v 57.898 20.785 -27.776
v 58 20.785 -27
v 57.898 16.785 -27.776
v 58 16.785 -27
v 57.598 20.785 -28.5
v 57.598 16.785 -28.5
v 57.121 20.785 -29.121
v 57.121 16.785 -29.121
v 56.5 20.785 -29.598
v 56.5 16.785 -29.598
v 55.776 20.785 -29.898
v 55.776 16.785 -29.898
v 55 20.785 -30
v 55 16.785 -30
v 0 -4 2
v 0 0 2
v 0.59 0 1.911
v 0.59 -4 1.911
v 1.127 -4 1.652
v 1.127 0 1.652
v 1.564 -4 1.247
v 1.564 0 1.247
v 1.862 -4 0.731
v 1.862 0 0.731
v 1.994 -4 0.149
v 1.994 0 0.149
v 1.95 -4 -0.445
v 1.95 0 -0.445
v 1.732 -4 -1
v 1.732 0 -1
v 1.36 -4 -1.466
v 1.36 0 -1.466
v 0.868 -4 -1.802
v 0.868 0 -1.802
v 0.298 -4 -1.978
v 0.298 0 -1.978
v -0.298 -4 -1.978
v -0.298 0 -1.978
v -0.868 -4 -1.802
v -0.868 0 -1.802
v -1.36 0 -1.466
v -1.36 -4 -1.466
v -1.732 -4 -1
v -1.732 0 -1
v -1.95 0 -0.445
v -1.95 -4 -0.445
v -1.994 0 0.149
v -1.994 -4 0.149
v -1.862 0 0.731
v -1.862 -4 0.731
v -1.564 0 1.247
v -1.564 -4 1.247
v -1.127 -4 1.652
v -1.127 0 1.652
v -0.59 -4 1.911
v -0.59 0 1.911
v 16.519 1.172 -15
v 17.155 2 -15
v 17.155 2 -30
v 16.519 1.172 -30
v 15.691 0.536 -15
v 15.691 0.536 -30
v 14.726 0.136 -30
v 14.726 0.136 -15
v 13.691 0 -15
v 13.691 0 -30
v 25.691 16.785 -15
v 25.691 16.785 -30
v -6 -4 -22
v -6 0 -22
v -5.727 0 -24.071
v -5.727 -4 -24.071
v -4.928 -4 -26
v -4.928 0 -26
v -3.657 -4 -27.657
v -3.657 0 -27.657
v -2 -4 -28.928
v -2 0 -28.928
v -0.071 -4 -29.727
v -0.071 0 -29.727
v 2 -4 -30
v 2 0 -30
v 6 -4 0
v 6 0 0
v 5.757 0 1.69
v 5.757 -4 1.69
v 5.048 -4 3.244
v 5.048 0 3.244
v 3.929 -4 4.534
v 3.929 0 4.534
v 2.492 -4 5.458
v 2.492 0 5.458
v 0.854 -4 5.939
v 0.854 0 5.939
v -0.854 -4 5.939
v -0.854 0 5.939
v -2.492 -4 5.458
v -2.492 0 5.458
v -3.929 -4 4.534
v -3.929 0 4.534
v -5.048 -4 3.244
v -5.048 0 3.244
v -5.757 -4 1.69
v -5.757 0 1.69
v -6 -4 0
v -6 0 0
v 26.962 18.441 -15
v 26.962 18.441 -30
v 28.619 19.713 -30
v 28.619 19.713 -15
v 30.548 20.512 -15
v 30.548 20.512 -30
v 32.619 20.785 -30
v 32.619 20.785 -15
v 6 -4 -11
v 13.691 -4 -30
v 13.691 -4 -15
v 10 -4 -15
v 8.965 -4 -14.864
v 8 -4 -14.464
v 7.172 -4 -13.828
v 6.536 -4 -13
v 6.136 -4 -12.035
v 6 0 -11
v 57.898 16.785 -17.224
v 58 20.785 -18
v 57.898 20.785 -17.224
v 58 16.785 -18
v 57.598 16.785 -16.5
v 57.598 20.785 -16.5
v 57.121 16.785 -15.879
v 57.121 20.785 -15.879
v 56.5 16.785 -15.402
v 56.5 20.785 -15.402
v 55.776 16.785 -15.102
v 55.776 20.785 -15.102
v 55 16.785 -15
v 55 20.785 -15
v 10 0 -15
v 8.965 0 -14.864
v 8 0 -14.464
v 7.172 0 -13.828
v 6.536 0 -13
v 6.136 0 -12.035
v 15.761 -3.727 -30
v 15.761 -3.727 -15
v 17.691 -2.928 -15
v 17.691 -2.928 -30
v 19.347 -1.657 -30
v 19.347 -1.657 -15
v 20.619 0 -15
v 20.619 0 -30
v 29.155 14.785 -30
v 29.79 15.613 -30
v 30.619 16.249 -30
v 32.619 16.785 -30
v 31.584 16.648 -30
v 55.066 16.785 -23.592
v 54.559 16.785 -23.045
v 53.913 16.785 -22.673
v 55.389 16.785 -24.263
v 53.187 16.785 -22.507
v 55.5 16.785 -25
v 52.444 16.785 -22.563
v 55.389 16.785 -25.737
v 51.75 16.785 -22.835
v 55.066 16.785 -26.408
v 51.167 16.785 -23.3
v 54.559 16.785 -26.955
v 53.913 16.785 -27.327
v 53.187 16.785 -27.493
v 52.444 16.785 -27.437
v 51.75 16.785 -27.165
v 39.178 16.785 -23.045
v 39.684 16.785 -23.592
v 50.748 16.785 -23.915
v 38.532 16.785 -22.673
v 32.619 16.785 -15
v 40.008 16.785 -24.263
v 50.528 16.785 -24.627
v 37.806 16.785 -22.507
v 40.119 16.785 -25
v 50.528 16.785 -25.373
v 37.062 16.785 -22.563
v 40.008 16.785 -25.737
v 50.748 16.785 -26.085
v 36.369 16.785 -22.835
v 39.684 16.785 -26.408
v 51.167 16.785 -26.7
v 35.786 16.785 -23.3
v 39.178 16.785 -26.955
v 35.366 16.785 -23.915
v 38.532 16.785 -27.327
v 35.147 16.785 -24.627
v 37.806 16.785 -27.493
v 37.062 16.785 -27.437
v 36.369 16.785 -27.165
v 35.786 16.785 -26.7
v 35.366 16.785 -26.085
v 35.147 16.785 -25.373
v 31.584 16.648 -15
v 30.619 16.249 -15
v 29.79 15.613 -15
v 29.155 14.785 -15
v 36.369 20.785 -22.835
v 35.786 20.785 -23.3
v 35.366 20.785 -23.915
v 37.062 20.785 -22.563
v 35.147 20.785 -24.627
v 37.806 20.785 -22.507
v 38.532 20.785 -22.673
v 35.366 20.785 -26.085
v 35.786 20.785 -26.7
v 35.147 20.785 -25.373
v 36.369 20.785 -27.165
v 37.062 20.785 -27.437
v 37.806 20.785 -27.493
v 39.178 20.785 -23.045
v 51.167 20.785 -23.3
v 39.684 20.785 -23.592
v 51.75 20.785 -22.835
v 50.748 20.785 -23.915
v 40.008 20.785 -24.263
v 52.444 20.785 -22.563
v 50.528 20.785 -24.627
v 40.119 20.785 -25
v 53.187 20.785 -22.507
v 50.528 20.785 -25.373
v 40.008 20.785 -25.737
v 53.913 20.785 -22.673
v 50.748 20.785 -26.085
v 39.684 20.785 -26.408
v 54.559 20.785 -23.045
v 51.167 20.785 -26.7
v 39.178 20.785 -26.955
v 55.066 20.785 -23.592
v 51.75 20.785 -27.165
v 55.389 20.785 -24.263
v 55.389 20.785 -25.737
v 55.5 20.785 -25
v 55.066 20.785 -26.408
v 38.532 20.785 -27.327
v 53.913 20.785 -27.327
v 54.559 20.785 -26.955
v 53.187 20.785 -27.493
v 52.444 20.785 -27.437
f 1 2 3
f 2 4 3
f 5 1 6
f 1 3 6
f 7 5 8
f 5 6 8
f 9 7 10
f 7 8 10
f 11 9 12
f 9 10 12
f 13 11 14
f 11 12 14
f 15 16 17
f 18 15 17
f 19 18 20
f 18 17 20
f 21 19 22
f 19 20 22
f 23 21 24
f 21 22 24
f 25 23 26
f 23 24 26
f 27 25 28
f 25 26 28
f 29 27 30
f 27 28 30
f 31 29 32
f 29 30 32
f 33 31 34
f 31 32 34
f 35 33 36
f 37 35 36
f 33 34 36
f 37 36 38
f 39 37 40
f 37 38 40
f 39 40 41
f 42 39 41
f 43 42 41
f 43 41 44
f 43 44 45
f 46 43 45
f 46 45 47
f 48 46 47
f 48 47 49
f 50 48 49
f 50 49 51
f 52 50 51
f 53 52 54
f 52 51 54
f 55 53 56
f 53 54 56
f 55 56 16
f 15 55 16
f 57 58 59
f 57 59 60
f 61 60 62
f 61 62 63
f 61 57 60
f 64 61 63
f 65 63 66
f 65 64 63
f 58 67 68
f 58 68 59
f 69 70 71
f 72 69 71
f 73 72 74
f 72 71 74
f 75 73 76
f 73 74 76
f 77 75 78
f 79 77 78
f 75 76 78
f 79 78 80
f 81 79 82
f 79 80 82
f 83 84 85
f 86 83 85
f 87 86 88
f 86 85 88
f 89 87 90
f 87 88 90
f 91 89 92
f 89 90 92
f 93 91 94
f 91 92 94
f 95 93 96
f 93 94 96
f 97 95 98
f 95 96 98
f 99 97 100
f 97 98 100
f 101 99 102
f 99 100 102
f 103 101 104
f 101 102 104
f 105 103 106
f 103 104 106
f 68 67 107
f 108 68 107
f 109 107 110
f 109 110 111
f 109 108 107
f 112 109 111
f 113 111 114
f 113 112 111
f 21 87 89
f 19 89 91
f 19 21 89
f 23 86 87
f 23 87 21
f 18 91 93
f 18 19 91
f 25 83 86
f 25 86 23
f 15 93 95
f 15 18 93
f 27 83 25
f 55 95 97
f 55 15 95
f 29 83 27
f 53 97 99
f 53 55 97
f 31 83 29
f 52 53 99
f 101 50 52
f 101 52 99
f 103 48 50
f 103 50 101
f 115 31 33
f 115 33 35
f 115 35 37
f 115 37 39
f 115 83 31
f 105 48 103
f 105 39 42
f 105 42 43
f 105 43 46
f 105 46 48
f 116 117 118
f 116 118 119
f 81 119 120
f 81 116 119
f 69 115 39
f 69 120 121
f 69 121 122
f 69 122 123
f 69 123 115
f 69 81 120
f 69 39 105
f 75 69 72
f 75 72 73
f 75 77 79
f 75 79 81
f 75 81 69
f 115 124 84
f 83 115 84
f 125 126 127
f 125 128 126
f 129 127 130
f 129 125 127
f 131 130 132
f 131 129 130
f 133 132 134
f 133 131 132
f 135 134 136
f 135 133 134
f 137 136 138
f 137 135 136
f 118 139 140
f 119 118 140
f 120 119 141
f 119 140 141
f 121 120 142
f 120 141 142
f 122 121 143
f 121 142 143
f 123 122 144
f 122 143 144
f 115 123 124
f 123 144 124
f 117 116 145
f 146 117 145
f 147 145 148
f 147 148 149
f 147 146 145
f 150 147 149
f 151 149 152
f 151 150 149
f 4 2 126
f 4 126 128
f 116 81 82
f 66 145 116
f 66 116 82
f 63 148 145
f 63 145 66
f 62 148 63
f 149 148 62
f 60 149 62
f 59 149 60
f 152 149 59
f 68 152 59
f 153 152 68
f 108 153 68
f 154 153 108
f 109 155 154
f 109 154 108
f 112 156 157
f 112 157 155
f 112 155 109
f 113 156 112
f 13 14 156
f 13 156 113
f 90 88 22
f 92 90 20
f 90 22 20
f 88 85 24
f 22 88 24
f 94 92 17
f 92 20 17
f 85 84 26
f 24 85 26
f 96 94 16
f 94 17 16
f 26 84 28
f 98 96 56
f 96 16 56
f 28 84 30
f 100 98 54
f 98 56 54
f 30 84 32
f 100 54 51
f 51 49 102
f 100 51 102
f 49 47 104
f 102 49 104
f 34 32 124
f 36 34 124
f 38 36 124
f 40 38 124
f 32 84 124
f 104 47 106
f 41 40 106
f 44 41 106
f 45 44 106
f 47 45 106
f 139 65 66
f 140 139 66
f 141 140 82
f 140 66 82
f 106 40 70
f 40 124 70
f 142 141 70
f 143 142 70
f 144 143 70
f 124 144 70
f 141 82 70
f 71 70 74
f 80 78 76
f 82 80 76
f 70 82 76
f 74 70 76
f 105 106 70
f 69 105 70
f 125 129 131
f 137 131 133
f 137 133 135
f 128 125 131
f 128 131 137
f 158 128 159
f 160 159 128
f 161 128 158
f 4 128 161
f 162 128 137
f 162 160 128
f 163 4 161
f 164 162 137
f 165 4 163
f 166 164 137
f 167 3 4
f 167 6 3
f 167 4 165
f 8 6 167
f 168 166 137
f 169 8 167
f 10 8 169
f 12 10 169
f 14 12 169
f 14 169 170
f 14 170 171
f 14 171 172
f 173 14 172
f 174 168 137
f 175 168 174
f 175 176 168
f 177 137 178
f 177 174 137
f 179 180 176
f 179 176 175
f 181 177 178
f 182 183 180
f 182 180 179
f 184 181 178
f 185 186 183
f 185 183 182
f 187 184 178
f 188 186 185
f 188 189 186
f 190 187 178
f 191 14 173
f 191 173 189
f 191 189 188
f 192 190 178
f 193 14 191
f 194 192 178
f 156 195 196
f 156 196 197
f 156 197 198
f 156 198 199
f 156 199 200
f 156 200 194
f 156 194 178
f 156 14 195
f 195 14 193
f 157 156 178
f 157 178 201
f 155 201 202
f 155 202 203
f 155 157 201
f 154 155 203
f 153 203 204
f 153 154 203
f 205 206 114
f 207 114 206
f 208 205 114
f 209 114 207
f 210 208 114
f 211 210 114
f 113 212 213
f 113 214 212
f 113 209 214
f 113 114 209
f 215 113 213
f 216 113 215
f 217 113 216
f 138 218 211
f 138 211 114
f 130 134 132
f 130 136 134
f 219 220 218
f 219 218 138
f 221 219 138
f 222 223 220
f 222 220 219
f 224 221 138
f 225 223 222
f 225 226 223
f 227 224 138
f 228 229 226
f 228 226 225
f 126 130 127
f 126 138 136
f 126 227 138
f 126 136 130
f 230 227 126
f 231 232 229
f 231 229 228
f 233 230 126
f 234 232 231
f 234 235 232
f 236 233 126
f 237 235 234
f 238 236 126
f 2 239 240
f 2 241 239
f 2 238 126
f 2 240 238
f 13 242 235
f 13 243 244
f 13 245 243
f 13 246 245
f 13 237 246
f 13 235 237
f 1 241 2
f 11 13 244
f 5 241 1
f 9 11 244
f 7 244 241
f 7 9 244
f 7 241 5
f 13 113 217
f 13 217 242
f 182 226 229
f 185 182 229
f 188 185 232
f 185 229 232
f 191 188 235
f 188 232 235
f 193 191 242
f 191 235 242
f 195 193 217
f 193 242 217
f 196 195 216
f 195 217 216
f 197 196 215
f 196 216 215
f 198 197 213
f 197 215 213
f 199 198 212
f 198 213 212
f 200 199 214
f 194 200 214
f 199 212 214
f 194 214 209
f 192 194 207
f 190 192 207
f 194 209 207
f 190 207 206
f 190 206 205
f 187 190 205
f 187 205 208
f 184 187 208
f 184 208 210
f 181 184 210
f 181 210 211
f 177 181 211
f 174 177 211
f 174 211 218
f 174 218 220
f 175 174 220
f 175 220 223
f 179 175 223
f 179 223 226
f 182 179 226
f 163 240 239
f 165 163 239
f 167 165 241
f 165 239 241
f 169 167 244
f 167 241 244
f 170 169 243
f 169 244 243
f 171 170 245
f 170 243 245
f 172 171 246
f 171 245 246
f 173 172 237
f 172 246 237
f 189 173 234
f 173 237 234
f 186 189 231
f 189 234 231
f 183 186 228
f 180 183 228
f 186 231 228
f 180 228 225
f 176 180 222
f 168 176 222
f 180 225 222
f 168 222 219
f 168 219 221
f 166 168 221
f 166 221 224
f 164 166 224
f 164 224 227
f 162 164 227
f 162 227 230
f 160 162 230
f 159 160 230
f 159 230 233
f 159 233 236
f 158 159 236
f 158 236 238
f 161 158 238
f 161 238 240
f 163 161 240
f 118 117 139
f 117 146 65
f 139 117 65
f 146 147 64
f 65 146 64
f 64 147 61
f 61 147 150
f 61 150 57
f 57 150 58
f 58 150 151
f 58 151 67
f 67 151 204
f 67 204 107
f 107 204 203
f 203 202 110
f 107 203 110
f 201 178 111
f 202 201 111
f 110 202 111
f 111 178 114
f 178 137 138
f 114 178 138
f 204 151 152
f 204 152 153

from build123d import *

# Parameters (mm, degrees)
SKETCH_1_R                       = 2
SM_BASE_FLANGE_1_DEPTH           = 4
SM_EDGE_FLANGE_1_STRIP_CUT_DEPTH = 15
SM_EDGE_FLANGE_1_DEPTH           = 15
SM_EDGE_FLANGE_2_STRIP_CUT_DEPTH = 15
SM_EDGE_FLANGE_2_DEPTH           = 15
FILLET_1_R                       = 3
FILLET_2_R                       = 3
CUT_EXTRUDE_1_REACH              = 71.845
SKETCH_14_R                      = 2.5
CUT_EXTRUDE_1_DIRECTION_2_DEPTH  = 70.844662484


# Sheet-metal steps are written as plain solids
with BuildPart() as part:
    # Sketch 1 → Базовая кромка1 (new body)
    with BuildSketch(Plane(origin=(0, 0, 0), x_dir=(1, 0, 0), z_dir=(0, 1, 0))):
        with BuildLine():
            Line((-6, 0), (-6, 22))
            ThreePointArc((-6, 22), (-3.656854249, 27.656854249), (2, 30))
            Line((2, 30), (16, 30))
            Line((16, 30), (16, 15))
            Line((16, 15), (10, 15))
            ThreePointArc((10, 15), (7.171572875, 13.828427125), (6, 11))
            Line((6, 11), (6, 0))
            ThreePointArc((6, 0), (0, -6), (-6, 0))
        make_face()
        with Locations(Location((0, 0, 0), (0, 0, 270))):
            Circle(SKETCH_1_R, mode=Mode.SUBTRACT)
    extrude(amount=-SM_BASE_FLANGE_1_DEPTH)

    # Ребро-кромка1 strip (across the edge) → Ребро-кромка1 strip cut (cut)
    with BuildSketch(Plane(origin=(16, 0, -15), x_dir=(-0.8660254037844366, 0.5000000000000038, 0), z_dir=(0, 0, -1))):
        Polygon((-20.784609691, 7.381197846), (0, -4.618802154), (2, -1.154700538), (-18.784609691, 10.845299462), align=None)
    extrude(amount=SM_EDGE_FLANGE_1_STRIP_CUT_DEPTH, mode=Mode.SUBTRACT)

    # Ребро-кромка1 section (across the edge) → Ребро-кромка1 (add)
    with BuildSketch(Plane(origin=(16, 0, -15), x_dir=(-0.8660254037844366, 0.5000000000000038, 0), z_dir=(0, 0, -1))):
        with BuildLine():
            Line((-4, 2.309401077), (-4, 21.690598923))
            Line((-4, 21.690598923), (0, 21.690598923))
            Line((0, 21.690598923), (0, 2.309401077))
            ThreePointArc((0, 2.309401077), (0.535898385, 0.309401077), (2, -1.154700538))
            Line((2, -1.154700538), (0, -4.618802154))
            ThreePointArc((0, -4.618802154), (-2.92820323, -1.690598923), (-4, 2.309401077))
        make_face()
    extrude(amount=SM_EDGE_FLANGE_1_DEPTH)

    # Ребро-кромка2 strip (across the edge) → Ребро-кромка2 strip cut (cut)
    with BuildSketch(Plane(origin=(30.309401077, 16.784609691, -30), x_dir=(0, -1, 0), z_dir=(0, 0, 1))):
        Polygon((-20.784609691, 7.381197846), (0, -4.618802154), (2, -1.154700538), (-18.784609691, 10.845299462), align=None)
    extrude(amount=SM_EDGE_FLANGE_2_STRIP_CUT_DEPTH, mode=Mode.SUBTRACT)

    # Ребро-кромка2 section (across the edge) → Ребро-кромка2 (add)
    with BuildSketch(Plane(origin=(30.309401077, 16.784609691, -30), x_dir=(0, -1, 0), z_dir=(0, 0, 1))):
        with BuildLine():
            Line((-4, 2.309401077), (-4, 27.690598923))
            Line((-4, 27.690598923), (0, 27.690598923))
            Line((0, 27.690598923), (0, 2.309401077))
            ThreePointArc((0, 2.309401077), (0.535898385, 0.309401077), (2, -1.154700538))
            Line((2, -1.154700538), (0, -4.618802154))
            ThreePointArc((0, -4.618802154), (-2.92820323, -1.690598923), (-4, 2.309401077))
        make_face()
    extrude(amount=SM_EDGE_FLANGE_2_DEPTH)

    # Скругление1
    fillet_1_edges = [part.edges().sort_by_distance(p)[0] for p in [
        (58, 18.784609691, -15),
    ]]
    fillet(fillet_1_edges, radius=FILLET_1_R)

    # Скругление2
    fillet_2_edges = [part.edges().sort_by_distance(p)[0] for p in [
        (58, 18.784609691, -30),
    ]]
    fillet(fillet_2_edges, radius=FILLET_2_R)

    # Эскиз14 → Вырез-Вытянуть1 (cut, up to next)
    with BuildSketch(Plane(origin=(0, 20.784609691, 0), x_dir=(1, 0, 0), z_dir=(0, 1, 0)), mode=Mode.PRIVATE) as cut_extrude_1_sk1:
        with Locations((53, 25)):
            Circle(SKETCH_14_R)
    cut_extrude_1_tool1 = extrude(cut_extrude_1_sk1.sketch, amount=-CUT_EXTRUDE_1_REACH, mode=Mode.PRIVATE) & part.part
    # Эскиз14 → Вырез-Вытянуть1 (cut, up to next)
    with BuildSketch(Plane(origin=(0, 20.784609691, 0), x_dir=(1, 0, 0), z_dir=(0, 1, 0)), mode=Mode.PRIVATE) as cut_extrude_1_sk2:
        with Locations((37.618802154, 25)):
            Circle(SKETCH_14_R)
    cut_extrude_1_tool2 = extrude(cut_extrude_1_sk2.sketch, amount=-CUT_EXTRUDE_1_REACH, mode=Mode.PRIVATE) & part.part
    add(cut_extrude_1_tool1.solids().sort_by_distance((53, 20.78461, -25))[0], mode=Mode.SUBTRACT)
    add(cut_extrude_1_tool2.solids().sort_by_distance((37.618802, 20.78461, -25))[0], mode=Mode.SUBTRACT)

    # Эскиз14 → Вырез-Вытянуть1 direction 2 (cut)
    with BuildSketch(Plane(origin=(0, 20.784609691, 0), x_dir=(1, 0, 0), z_dir=(0, 1, 0))):
        with Locations((53, 25)):
            Circle(SKETCH_14_R)
        with Locations((37.618802154, 25)):
            Circle(SKETCH_14_R)
    extrude(amount=CUT_EXTRUDE_1_DIRECTION_2_DEPTH, mode=Mode.SUBTRACT)


solid = part.part
